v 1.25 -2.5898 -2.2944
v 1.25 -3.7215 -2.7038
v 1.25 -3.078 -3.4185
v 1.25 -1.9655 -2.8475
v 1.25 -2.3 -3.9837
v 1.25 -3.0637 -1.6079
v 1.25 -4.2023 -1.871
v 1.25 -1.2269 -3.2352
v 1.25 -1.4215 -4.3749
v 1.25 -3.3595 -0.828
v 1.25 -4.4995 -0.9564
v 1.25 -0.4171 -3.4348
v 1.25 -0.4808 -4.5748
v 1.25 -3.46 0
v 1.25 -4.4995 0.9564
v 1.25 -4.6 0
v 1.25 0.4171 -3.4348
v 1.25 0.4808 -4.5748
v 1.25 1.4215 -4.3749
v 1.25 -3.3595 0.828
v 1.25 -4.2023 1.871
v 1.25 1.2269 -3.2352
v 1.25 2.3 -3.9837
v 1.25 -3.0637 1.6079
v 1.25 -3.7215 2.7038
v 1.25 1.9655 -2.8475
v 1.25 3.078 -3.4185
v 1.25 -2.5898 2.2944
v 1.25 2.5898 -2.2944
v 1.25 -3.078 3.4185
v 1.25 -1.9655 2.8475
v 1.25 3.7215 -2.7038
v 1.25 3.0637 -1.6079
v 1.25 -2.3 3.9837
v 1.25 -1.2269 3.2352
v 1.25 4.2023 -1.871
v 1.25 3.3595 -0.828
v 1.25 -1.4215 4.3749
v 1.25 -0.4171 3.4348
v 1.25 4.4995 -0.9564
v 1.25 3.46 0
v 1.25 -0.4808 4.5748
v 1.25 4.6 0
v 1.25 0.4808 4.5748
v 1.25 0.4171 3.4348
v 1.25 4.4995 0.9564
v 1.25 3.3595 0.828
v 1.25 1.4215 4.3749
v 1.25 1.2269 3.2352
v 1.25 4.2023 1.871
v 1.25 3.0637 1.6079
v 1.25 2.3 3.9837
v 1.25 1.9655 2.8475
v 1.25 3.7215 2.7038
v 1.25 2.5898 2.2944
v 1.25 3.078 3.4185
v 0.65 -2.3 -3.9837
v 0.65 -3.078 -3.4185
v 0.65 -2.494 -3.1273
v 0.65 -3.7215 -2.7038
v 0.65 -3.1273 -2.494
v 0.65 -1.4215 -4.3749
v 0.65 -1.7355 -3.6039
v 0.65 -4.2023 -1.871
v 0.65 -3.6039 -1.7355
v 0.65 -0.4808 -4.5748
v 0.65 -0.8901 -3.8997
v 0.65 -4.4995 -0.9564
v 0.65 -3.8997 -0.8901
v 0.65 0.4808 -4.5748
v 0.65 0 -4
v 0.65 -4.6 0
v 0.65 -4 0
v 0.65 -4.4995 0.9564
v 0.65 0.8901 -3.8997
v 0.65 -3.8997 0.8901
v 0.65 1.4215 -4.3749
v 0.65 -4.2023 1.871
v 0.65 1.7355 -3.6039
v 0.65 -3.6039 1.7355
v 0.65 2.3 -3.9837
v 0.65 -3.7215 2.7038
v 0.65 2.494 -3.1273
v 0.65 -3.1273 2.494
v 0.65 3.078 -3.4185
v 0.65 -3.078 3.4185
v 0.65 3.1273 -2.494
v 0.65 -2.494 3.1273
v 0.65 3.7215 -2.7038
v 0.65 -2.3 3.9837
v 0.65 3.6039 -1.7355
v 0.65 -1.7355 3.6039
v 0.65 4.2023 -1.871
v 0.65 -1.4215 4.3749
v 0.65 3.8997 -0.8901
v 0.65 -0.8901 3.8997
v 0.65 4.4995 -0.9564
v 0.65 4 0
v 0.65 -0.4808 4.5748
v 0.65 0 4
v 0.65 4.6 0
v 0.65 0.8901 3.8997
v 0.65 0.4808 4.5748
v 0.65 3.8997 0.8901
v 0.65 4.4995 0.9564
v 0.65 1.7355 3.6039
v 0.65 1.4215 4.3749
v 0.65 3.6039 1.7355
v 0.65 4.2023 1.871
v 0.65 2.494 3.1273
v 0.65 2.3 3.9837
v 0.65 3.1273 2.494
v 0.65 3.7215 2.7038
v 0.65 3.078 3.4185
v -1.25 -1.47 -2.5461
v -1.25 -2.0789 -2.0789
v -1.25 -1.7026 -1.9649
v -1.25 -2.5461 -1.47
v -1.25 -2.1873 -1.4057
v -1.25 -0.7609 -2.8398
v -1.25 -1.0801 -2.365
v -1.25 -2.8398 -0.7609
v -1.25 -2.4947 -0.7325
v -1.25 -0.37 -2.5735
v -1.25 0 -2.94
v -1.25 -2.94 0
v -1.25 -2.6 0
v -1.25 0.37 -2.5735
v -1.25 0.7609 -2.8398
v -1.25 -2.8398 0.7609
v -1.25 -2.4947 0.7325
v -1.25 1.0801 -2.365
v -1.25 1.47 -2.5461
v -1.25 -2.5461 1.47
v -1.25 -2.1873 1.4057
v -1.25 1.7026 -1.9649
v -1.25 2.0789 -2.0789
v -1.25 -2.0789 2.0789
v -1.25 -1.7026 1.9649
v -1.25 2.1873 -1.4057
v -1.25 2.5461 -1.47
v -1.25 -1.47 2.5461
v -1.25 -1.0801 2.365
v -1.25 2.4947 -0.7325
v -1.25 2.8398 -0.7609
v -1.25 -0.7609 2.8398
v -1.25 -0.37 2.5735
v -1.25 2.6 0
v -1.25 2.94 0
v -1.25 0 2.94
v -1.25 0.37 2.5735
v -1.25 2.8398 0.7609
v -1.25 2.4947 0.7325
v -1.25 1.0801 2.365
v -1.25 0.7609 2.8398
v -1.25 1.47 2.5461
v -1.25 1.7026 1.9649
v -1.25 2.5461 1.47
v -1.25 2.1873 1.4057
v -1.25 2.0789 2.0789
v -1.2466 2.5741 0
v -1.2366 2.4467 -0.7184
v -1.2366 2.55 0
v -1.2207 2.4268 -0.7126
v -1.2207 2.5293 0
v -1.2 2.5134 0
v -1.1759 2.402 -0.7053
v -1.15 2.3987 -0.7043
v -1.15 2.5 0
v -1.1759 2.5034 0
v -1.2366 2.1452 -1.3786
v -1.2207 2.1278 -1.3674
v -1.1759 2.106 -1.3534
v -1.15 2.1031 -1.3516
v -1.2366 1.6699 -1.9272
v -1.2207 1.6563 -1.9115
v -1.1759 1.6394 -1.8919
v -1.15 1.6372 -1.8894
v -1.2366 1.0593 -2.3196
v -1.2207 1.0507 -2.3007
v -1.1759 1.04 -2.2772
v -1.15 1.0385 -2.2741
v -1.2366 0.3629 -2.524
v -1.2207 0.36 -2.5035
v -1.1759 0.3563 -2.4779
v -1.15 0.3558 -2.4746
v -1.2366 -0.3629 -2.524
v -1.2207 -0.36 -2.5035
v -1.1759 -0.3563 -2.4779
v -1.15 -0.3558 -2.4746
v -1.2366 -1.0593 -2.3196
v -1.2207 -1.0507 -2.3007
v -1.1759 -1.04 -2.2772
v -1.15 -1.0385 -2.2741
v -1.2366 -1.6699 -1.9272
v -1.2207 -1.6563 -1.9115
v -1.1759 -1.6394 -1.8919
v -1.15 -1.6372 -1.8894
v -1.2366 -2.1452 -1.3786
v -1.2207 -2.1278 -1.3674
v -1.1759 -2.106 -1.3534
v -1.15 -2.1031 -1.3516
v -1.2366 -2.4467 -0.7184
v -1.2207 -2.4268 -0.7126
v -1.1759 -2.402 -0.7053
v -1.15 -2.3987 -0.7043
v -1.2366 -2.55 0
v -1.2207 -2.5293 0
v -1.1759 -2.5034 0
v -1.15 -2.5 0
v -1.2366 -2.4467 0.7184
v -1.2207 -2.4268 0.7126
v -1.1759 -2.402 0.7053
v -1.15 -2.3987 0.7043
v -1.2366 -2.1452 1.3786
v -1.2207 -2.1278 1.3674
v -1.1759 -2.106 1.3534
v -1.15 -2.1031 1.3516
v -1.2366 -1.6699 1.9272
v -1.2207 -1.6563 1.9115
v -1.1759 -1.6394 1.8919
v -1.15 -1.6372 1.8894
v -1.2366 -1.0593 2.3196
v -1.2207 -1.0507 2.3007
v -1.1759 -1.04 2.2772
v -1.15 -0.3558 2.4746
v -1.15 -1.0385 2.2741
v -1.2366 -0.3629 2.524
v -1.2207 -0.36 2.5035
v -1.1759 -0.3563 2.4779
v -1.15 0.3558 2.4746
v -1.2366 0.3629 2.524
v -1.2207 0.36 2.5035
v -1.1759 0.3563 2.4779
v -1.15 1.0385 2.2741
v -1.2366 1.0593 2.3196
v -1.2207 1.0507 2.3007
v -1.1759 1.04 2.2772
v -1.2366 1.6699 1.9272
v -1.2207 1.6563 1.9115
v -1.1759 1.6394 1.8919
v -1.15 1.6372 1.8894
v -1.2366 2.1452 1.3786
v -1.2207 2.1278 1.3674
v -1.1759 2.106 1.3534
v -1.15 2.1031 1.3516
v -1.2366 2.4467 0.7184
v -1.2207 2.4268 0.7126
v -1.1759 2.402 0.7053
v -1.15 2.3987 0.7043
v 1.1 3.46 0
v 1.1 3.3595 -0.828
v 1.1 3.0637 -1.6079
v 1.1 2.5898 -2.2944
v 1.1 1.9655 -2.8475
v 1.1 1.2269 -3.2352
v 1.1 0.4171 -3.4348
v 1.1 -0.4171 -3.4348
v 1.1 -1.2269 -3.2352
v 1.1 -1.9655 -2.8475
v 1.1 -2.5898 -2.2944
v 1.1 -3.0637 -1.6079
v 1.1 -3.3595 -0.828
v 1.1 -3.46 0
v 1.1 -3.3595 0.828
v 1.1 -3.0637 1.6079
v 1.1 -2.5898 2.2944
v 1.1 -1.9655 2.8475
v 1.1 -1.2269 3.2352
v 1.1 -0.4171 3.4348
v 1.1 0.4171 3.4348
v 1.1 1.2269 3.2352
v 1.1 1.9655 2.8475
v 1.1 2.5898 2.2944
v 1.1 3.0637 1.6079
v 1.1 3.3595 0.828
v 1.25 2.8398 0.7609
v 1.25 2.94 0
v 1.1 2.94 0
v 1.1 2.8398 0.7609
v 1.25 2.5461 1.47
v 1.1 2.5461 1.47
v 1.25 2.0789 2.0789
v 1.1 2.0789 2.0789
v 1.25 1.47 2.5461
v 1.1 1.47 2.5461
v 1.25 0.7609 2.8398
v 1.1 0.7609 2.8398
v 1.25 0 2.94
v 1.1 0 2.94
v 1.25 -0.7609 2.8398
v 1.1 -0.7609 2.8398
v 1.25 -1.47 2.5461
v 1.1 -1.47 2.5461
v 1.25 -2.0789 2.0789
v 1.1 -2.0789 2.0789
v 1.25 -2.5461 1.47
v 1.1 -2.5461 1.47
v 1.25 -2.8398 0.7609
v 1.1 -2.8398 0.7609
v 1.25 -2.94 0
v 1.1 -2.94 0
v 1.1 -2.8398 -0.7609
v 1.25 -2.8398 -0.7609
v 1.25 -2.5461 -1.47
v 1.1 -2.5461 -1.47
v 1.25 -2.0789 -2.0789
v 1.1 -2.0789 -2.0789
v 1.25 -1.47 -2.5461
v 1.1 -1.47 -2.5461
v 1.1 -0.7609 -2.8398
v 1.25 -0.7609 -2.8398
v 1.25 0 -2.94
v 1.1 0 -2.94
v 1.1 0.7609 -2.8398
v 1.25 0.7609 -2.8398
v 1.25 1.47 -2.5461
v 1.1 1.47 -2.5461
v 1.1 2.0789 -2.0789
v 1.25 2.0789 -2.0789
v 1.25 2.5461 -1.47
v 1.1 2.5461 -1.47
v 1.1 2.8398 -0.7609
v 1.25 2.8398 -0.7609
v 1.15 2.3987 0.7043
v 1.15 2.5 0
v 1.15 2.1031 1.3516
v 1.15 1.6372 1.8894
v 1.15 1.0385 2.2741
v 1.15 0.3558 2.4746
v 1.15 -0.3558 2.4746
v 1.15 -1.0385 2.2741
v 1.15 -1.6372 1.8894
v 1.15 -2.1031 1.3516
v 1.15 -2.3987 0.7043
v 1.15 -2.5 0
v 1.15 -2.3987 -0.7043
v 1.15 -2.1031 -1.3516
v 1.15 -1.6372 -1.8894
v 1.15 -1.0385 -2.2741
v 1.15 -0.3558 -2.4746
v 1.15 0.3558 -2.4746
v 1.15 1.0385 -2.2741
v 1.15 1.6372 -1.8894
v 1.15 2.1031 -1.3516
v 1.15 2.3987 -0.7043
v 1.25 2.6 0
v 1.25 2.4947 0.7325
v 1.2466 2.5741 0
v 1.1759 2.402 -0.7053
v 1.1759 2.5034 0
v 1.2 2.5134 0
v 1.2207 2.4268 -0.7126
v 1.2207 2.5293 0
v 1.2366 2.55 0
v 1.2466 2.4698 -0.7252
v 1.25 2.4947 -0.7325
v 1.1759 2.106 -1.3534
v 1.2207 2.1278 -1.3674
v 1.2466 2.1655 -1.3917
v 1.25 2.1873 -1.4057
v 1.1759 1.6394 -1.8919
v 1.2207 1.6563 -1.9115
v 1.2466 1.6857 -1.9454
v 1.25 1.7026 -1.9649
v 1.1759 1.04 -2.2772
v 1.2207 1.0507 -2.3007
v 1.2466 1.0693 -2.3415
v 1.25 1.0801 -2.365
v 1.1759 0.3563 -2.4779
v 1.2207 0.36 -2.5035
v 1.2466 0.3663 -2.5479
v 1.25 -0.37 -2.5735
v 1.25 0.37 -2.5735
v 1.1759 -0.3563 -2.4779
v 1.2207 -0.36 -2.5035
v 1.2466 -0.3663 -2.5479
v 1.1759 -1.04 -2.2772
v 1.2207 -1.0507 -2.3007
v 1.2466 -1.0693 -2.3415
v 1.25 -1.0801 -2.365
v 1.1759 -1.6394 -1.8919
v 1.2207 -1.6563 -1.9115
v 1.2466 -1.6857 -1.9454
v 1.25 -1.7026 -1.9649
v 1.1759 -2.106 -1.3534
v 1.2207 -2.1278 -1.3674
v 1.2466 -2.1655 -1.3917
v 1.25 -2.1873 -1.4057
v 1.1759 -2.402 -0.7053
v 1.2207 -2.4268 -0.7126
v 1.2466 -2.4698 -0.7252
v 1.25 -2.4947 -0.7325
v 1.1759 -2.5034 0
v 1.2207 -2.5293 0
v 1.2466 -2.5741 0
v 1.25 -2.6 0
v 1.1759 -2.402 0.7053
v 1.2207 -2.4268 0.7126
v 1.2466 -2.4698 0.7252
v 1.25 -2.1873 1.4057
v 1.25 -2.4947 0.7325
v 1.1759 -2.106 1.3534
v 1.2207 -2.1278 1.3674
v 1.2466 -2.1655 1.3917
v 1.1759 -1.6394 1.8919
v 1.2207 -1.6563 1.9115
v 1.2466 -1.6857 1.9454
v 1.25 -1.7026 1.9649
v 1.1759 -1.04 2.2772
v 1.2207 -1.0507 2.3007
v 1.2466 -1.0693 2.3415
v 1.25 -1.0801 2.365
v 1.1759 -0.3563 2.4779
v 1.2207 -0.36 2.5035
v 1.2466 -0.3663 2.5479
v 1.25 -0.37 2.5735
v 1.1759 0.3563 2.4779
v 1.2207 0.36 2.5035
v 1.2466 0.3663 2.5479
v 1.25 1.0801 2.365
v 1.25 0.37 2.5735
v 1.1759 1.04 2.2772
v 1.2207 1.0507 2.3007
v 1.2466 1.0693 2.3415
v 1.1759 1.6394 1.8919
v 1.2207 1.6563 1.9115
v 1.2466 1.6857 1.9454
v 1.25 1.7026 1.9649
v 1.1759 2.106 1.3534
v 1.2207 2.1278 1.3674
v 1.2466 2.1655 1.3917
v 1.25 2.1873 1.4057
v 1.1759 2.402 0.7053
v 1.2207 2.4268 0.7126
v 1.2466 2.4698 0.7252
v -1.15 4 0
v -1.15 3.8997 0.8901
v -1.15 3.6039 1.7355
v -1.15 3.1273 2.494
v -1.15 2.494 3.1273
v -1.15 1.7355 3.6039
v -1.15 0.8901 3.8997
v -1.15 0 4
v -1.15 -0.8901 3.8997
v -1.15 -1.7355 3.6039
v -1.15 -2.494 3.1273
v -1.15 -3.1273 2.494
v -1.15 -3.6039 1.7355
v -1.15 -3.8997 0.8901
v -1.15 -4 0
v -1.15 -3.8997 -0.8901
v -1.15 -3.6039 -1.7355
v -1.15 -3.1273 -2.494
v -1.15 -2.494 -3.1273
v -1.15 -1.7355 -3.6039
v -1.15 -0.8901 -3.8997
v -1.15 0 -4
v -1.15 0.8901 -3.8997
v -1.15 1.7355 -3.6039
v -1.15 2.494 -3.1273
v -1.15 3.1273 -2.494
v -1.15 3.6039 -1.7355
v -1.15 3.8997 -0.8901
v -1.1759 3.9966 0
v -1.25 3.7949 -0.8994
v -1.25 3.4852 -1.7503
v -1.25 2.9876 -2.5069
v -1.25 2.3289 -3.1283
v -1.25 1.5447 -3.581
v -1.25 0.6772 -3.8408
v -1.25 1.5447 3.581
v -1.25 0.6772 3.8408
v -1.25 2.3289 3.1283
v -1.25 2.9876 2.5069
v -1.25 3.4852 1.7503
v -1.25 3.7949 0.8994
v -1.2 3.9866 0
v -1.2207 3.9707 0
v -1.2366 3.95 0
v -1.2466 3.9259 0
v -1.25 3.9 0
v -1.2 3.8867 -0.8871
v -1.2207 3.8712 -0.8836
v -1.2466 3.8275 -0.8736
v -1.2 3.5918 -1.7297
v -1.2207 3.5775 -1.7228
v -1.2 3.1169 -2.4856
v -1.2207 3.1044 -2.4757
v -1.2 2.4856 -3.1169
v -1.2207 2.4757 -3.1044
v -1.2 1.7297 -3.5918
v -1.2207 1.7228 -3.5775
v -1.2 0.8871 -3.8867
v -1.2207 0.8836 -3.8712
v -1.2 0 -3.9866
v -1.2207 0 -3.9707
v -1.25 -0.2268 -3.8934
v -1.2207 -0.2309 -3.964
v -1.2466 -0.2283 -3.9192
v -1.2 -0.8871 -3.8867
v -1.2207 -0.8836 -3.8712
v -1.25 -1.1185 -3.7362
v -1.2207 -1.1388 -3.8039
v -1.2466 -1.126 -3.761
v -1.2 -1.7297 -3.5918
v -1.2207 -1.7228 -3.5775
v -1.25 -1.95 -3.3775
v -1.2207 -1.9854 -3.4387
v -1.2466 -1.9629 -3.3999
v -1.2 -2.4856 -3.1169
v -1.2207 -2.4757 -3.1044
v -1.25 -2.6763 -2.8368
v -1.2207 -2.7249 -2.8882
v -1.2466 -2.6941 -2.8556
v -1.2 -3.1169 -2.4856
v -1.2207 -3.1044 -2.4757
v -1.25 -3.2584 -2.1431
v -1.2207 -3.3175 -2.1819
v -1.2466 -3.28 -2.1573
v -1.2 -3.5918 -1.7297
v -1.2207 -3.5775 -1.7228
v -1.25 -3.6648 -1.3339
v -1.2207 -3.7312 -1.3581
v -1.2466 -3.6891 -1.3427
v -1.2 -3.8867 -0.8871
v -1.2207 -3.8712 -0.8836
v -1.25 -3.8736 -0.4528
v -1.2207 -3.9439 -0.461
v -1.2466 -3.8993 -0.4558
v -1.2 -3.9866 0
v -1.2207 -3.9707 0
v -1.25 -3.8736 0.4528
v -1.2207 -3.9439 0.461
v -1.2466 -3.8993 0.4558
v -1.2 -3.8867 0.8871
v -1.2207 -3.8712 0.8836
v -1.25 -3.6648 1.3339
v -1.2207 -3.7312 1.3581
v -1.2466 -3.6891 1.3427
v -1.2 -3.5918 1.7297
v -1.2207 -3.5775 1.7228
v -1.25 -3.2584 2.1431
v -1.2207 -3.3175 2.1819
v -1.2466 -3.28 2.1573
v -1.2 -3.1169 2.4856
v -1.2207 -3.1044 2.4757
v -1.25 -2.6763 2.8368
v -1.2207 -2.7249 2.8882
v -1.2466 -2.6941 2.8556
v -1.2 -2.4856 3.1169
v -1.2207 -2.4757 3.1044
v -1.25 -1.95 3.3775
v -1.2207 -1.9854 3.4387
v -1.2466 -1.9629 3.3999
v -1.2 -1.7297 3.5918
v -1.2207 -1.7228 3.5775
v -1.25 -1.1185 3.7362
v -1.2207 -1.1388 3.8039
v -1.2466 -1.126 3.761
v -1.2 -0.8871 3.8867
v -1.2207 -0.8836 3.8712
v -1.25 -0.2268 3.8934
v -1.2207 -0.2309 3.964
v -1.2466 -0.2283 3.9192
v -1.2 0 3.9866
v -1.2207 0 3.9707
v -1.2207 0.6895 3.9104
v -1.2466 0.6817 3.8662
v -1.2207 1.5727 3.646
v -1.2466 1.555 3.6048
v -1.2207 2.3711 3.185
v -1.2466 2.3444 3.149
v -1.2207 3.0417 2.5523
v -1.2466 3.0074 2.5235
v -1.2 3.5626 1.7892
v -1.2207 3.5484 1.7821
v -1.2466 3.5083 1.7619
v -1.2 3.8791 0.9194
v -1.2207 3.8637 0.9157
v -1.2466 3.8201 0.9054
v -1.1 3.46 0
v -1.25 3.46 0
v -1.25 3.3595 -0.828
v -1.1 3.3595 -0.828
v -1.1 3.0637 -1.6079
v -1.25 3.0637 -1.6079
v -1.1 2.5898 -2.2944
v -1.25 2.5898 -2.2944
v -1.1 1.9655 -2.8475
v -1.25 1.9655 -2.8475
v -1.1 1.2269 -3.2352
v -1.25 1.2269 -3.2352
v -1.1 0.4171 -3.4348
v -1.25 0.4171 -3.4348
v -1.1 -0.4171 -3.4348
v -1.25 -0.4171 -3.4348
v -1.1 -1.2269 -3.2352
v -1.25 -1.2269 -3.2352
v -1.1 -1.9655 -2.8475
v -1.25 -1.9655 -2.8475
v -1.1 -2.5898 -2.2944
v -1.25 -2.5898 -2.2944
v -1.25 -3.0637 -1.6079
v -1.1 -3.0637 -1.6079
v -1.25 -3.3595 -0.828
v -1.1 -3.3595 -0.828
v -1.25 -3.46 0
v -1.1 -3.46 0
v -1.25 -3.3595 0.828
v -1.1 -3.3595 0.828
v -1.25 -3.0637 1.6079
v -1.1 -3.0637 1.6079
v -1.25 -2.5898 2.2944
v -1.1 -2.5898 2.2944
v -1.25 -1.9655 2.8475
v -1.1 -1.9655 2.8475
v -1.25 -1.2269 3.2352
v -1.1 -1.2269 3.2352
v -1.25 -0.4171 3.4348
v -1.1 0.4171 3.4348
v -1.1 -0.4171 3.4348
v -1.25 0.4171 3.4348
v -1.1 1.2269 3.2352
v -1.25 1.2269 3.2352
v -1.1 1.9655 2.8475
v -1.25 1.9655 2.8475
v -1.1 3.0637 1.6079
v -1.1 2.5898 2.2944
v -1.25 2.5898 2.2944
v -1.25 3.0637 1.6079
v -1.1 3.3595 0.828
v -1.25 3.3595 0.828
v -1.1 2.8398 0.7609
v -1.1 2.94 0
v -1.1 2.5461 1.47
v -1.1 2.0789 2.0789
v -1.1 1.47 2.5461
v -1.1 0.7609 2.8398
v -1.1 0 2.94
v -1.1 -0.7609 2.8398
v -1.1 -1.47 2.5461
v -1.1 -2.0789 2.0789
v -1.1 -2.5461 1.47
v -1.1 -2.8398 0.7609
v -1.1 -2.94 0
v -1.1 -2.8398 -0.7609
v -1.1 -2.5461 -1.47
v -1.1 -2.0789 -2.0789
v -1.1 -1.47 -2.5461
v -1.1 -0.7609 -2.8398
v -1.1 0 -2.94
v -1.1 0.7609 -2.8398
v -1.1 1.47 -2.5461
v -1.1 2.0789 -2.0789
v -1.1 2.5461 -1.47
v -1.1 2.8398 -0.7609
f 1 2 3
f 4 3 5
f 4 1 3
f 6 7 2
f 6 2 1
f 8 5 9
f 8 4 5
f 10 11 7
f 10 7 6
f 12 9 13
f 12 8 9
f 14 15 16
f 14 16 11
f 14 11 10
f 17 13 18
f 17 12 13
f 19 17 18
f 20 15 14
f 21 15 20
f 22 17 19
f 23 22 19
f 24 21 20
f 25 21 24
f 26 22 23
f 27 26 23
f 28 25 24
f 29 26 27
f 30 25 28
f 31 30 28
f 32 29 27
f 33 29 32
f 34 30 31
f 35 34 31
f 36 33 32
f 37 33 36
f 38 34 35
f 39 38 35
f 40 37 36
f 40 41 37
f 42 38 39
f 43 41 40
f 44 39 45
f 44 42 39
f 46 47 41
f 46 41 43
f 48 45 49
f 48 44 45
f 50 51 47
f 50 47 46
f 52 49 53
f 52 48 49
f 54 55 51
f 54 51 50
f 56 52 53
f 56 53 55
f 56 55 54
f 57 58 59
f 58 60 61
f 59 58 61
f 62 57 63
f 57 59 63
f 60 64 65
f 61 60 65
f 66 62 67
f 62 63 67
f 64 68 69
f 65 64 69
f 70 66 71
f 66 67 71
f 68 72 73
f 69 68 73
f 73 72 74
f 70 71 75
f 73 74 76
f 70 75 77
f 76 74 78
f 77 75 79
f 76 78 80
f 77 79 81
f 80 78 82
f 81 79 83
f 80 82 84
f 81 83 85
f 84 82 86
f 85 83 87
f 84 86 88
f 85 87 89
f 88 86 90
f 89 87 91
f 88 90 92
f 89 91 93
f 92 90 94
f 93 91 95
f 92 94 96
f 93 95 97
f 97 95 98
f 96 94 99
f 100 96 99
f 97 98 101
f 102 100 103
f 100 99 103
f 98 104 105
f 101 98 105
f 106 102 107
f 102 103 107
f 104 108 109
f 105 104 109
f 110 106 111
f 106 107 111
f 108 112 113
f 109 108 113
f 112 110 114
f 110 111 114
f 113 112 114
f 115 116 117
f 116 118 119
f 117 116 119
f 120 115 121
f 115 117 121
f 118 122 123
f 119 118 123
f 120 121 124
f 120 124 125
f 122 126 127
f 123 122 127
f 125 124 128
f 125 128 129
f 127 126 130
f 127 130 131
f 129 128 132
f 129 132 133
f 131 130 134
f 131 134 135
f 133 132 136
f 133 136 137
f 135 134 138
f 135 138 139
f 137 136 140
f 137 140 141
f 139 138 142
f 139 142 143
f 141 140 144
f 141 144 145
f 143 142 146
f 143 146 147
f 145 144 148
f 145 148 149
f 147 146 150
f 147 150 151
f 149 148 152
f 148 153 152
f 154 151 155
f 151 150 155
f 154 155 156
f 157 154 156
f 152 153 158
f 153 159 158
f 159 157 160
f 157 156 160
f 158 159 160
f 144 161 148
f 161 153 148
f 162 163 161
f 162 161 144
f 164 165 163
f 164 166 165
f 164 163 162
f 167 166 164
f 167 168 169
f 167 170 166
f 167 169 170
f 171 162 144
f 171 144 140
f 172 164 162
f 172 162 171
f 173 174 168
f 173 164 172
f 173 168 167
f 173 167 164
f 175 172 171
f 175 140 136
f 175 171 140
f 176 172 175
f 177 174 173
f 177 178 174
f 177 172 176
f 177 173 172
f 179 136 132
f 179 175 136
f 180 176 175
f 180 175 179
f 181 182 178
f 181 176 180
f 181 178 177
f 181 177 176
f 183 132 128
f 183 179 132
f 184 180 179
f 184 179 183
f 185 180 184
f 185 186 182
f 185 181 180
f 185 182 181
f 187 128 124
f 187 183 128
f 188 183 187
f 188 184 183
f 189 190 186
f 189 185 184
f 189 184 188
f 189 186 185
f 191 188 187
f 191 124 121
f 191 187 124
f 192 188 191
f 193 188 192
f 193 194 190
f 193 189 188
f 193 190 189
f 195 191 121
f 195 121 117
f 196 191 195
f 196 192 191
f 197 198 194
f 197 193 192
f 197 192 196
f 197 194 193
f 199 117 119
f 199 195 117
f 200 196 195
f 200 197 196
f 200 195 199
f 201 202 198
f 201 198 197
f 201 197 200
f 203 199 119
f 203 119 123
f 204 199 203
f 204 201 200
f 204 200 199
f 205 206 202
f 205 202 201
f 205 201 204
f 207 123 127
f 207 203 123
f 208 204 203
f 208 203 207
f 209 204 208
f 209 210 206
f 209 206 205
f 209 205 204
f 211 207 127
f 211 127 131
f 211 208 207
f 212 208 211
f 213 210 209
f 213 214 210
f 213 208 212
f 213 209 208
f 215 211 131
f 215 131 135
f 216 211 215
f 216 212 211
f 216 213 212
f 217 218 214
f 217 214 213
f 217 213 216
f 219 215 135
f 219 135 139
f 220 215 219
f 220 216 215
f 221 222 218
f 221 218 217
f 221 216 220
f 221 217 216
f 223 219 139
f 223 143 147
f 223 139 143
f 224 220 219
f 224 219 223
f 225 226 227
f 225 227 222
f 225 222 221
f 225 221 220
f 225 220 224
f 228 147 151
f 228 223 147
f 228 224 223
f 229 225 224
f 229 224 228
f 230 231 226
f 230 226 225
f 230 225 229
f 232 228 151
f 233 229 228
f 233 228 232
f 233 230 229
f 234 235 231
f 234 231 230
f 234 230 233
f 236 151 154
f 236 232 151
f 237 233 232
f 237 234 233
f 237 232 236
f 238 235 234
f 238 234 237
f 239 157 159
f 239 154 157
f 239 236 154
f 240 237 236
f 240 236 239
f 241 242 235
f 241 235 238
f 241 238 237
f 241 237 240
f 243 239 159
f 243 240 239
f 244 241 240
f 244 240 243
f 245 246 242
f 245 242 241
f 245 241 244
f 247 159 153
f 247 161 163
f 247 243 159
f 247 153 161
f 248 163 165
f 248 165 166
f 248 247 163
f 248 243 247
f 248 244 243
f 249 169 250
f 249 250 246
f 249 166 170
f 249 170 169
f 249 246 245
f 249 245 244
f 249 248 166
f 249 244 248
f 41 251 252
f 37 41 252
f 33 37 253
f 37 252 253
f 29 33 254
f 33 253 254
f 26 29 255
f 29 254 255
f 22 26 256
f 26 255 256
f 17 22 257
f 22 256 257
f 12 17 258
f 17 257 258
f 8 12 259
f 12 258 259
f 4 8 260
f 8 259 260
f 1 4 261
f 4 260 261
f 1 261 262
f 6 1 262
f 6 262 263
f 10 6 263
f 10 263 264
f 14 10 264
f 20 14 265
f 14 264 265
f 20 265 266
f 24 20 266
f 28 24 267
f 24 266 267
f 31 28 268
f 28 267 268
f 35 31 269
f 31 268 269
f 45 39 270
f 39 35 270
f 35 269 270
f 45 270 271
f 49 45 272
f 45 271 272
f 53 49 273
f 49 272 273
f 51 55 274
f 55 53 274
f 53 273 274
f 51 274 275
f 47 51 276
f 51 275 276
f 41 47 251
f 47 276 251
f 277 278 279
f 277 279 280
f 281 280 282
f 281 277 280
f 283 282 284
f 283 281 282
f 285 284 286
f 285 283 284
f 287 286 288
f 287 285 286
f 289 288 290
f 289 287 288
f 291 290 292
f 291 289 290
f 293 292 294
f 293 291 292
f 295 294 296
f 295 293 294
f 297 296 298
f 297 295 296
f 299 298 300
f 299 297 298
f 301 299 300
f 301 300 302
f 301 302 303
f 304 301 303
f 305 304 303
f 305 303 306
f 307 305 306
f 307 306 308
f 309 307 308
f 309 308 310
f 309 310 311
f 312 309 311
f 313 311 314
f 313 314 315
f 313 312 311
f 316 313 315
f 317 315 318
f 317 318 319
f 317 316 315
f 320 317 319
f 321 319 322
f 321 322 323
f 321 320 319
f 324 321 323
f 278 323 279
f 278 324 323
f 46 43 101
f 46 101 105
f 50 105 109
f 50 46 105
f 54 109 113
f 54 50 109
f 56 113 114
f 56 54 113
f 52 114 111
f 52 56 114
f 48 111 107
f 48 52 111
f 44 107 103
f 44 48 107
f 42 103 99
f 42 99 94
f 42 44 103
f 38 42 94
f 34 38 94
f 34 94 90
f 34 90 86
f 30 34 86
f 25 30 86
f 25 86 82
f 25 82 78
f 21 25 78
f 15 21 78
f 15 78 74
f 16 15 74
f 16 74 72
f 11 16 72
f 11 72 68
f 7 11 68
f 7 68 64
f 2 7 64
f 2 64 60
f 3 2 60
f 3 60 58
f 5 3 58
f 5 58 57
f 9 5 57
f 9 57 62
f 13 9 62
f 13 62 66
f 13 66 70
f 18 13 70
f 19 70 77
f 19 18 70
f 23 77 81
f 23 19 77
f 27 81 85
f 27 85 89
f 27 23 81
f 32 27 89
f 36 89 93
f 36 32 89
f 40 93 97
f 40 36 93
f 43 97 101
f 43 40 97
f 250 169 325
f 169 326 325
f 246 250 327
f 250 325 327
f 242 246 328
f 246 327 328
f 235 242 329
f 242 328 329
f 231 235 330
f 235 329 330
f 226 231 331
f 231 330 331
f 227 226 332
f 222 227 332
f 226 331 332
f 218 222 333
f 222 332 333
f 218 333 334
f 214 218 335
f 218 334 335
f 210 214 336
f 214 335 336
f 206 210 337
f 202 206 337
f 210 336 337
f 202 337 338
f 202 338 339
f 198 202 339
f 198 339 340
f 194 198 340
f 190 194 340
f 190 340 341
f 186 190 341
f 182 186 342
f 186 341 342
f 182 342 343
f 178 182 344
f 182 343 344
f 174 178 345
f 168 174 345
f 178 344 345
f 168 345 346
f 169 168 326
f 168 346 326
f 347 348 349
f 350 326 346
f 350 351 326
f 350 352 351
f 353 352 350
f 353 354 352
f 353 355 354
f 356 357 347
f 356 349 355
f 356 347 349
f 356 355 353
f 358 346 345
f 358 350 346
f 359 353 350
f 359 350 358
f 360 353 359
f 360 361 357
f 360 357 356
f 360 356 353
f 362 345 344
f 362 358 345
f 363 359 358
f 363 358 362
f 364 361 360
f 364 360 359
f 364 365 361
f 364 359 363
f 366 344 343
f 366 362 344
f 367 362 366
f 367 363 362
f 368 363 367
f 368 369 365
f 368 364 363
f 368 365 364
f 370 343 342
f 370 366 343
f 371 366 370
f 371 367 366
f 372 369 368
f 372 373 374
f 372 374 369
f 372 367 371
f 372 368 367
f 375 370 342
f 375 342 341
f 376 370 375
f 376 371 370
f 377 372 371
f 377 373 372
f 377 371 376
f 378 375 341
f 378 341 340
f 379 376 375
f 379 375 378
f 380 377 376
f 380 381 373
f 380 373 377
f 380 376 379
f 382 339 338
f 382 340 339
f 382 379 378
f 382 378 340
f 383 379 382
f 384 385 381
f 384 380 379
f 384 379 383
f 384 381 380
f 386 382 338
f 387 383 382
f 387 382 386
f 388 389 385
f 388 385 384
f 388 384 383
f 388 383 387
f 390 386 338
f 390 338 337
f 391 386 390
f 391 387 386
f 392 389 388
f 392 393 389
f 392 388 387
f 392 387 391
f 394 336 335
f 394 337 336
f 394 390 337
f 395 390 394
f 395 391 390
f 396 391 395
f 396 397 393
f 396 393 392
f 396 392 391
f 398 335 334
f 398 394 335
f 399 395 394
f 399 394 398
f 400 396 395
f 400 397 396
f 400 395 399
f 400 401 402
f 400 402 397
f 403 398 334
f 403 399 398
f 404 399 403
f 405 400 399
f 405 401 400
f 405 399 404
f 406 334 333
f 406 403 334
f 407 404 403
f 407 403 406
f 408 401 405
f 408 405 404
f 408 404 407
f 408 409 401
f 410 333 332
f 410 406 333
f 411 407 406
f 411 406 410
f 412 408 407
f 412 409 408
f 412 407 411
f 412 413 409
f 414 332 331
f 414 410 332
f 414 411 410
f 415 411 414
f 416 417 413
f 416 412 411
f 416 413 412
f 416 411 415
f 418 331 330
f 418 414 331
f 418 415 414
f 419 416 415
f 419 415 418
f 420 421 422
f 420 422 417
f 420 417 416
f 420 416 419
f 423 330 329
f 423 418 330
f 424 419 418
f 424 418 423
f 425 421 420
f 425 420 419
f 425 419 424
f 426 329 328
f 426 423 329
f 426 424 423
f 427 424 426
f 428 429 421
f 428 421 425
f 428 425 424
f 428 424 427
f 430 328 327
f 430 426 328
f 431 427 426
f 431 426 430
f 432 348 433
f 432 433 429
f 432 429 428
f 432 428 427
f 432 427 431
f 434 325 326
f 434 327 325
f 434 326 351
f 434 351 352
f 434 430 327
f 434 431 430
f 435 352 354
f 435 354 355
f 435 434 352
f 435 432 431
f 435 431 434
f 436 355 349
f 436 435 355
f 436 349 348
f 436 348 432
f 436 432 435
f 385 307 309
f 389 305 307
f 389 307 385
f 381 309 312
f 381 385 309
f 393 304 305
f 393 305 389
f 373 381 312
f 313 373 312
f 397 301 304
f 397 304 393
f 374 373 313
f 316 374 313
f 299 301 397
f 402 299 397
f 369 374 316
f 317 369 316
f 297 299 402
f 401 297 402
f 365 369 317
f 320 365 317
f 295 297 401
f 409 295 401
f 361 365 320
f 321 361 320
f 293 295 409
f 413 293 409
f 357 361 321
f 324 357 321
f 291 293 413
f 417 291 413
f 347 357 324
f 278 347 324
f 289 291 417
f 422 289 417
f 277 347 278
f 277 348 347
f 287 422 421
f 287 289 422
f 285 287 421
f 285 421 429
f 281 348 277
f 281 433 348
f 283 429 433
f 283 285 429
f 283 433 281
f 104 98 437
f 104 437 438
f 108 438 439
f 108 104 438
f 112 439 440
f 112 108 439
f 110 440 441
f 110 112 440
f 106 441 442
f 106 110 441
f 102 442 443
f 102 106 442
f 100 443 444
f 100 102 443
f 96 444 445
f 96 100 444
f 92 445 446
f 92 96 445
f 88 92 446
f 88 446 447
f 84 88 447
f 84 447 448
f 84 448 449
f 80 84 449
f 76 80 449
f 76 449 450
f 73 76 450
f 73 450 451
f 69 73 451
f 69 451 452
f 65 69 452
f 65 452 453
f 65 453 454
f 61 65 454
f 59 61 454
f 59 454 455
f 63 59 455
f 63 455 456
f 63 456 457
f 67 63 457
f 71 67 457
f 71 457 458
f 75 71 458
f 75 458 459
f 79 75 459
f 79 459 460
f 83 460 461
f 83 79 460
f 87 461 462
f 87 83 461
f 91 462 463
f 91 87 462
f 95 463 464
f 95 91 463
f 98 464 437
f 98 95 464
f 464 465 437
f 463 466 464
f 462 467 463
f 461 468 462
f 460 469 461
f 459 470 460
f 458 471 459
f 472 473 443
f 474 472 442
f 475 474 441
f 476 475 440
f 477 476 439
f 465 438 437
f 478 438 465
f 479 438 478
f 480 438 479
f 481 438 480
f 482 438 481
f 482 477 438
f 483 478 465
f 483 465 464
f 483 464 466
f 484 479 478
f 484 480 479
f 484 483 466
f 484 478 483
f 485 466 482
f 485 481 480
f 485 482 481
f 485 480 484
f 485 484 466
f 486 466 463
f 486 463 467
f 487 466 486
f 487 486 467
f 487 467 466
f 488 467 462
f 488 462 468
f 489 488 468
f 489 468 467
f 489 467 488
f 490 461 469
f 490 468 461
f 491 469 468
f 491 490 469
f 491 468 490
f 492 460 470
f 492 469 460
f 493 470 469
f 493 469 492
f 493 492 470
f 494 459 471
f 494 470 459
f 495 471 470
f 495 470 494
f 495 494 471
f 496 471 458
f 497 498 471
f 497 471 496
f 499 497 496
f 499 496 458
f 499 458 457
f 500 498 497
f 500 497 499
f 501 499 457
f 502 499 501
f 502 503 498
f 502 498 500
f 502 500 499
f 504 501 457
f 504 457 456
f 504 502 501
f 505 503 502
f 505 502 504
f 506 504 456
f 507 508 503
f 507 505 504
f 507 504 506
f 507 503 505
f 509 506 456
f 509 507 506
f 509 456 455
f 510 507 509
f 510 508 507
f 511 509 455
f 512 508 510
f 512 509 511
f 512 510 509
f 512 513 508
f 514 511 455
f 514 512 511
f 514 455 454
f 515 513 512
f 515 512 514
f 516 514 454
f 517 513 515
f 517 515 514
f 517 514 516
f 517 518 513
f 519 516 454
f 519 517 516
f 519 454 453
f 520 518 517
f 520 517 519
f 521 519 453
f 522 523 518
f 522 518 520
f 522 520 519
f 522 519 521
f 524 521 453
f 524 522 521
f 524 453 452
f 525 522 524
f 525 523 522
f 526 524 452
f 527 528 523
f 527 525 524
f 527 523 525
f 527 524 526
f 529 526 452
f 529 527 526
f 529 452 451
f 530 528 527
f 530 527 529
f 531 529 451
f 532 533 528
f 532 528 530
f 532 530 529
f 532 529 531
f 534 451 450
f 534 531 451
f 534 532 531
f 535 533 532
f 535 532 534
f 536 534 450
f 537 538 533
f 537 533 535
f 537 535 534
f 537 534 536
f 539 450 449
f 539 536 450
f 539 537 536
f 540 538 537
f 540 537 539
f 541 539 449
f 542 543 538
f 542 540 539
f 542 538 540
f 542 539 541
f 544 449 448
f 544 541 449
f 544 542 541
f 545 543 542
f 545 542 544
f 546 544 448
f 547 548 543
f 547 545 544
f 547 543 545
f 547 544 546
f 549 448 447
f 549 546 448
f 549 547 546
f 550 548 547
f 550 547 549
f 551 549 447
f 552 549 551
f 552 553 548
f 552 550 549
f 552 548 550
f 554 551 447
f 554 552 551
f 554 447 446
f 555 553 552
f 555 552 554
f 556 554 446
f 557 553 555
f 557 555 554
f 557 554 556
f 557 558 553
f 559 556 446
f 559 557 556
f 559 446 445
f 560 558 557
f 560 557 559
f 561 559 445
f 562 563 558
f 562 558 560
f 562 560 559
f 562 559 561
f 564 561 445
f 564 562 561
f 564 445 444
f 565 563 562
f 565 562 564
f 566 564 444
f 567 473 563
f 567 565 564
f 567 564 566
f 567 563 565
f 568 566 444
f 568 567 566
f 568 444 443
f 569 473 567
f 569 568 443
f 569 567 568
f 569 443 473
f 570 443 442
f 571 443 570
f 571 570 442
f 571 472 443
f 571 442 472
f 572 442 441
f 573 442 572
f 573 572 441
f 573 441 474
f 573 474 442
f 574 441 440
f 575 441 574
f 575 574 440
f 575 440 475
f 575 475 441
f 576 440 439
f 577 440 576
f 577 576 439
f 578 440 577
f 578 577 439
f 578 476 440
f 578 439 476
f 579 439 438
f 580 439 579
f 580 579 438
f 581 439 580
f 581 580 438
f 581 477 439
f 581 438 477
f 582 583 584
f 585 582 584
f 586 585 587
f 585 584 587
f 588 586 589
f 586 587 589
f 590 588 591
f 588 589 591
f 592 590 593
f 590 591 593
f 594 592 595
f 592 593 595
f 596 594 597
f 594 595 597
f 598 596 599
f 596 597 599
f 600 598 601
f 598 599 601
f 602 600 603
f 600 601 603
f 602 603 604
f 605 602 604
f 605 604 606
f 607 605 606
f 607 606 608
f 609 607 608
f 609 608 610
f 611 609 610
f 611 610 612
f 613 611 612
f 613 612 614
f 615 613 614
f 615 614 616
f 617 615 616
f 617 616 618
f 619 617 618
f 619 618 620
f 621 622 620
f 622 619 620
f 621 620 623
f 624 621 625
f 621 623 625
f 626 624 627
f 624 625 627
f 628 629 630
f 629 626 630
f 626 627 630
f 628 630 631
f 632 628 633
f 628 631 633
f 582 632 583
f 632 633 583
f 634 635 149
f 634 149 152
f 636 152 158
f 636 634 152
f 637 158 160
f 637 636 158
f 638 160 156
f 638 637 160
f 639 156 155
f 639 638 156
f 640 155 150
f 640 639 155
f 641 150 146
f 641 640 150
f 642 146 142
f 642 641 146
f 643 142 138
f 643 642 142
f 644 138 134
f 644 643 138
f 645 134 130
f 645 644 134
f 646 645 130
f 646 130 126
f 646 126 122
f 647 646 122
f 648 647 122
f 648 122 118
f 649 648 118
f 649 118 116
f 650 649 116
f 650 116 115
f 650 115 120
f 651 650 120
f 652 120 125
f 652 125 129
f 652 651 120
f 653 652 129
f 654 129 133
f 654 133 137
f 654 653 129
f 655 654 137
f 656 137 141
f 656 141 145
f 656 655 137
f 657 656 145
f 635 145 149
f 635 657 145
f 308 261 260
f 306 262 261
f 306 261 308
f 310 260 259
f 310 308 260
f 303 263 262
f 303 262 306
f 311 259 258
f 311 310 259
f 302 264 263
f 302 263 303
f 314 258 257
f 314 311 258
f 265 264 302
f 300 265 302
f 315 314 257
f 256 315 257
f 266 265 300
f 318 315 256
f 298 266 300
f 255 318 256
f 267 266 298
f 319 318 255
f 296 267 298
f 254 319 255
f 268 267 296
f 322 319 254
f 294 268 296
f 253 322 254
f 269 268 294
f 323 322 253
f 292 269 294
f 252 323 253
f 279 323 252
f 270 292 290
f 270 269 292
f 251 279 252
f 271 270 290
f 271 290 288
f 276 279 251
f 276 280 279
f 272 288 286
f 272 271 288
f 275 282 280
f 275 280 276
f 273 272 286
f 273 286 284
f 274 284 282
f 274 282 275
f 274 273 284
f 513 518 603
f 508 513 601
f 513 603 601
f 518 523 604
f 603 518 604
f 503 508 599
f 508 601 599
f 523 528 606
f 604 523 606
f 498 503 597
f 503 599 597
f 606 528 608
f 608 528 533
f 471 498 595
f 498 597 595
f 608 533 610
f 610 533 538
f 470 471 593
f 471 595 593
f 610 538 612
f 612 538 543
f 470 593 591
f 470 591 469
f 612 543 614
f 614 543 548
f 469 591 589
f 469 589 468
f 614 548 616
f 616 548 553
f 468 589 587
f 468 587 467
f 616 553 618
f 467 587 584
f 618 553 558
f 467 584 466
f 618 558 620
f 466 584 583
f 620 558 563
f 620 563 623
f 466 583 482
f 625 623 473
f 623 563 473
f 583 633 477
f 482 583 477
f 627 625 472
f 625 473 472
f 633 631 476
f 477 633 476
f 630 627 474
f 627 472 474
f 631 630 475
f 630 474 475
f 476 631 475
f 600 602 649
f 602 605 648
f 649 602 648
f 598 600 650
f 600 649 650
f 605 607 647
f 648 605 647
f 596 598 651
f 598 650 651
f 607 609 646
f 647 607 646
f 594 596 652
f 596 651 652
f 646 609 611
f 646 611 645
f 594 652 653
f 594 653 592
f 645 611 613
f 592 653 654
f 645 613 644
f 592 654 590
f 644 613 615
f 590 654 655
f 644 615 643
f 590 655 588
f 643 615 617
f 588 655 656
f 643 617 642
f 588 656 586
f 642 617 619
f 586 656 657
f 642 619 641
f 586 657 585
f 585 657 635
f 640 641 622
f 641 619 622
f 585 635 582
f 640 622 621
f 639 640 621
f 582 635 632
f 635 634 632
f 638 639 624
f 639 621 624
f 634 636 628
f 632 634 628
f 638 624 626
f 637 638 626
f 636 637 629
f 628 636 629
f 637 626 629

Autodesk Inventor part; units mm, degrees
ref_plane "YZ Plane" through (0, 0, 0) normal (1, 0, 0) x (0, 1, 0)
ref_plane "XZ Plane" through (0, 0, 0) normal (0, 1, 0) x (-1, 0, 0)
ref_plane "XY Plane" through (0, 0, 0) normal (0, 0, 1) x (1, 0, 0)
sketch "_____1" plane through (0, 0, 0) normal (0, 0, 1) x (1, 0, 0)
  line L0 (50, 0) -> (-50, 0)
  line L1 (-1.25, 0) -> (-1.25, 2.94)
  line L2 (-1.25, 2.94) -> (-1.1, 2.94)
  line L3 (-1.1, 2.94) -> (-1.1, 3.46)
  line L4 (-1.1, 3.46) -> (-1.25, 3.46)
  line L5 (-1.25, 3.46) -> (-1.25, 3.9)
  arc A0 (-1.15, 4) -> (-1.25, 3.9) centre (-1.15, 3.9) ccw
  line L6 (-1.15, 4) -> (0.65, 4)
  line L7 (0.65, 4) -> (0.65, 4.6)
  line L8 (0.65, 4.6) -> (1.25, 4.6)
  line L9 (1.25, 4.6) -> (1.25, 3.46)
  line L10 (1.25, 3.46) -> (1.1, 3.46)
  line L11 (1.1, 3.46) -> (1.1, 2.94)
  line L12 (1.1, 2.94) -> (1.25, 2.94)
  line L13 (1.25, 2.94) -> (1.25, 0)
  line L14 (1.25, 0) -> (-1.25, 0)
revolve "Revolution1" add sketch "_____1" angle 360 about axis through (50, 0, 0) along (1, 0, 0)
sketch "_____2" plane through (0, 0, 0) normal (0, 0, 1) x (1, 0, 0)
  line L0 (50, 0) -> (-50, 0)
  line L1 (-1.25, 0) -> (-1.25, 2.6)
  arc A0 (-1.25, 2.6) -> (-1.15, 2.5) centre (-1.15, 2.6) ccw
  line L2 (-1.15, 2.5) -> (1.15, 2.5)
  arc A1 (1.15, 2.5) -> (1.25, 2.6) centre (1.15, 2.6) ccw
  line L3 (1.25, 2.6) -> (1.25, 0)
  line L4 (1.25, 0) -> (-1.25, 0)
revolve "Revolution2" cut sketch "_____2" angle 360 about axis through (50, 0, 0) along (1, 0, 0)
properties part number "C-FL675ZZ"
